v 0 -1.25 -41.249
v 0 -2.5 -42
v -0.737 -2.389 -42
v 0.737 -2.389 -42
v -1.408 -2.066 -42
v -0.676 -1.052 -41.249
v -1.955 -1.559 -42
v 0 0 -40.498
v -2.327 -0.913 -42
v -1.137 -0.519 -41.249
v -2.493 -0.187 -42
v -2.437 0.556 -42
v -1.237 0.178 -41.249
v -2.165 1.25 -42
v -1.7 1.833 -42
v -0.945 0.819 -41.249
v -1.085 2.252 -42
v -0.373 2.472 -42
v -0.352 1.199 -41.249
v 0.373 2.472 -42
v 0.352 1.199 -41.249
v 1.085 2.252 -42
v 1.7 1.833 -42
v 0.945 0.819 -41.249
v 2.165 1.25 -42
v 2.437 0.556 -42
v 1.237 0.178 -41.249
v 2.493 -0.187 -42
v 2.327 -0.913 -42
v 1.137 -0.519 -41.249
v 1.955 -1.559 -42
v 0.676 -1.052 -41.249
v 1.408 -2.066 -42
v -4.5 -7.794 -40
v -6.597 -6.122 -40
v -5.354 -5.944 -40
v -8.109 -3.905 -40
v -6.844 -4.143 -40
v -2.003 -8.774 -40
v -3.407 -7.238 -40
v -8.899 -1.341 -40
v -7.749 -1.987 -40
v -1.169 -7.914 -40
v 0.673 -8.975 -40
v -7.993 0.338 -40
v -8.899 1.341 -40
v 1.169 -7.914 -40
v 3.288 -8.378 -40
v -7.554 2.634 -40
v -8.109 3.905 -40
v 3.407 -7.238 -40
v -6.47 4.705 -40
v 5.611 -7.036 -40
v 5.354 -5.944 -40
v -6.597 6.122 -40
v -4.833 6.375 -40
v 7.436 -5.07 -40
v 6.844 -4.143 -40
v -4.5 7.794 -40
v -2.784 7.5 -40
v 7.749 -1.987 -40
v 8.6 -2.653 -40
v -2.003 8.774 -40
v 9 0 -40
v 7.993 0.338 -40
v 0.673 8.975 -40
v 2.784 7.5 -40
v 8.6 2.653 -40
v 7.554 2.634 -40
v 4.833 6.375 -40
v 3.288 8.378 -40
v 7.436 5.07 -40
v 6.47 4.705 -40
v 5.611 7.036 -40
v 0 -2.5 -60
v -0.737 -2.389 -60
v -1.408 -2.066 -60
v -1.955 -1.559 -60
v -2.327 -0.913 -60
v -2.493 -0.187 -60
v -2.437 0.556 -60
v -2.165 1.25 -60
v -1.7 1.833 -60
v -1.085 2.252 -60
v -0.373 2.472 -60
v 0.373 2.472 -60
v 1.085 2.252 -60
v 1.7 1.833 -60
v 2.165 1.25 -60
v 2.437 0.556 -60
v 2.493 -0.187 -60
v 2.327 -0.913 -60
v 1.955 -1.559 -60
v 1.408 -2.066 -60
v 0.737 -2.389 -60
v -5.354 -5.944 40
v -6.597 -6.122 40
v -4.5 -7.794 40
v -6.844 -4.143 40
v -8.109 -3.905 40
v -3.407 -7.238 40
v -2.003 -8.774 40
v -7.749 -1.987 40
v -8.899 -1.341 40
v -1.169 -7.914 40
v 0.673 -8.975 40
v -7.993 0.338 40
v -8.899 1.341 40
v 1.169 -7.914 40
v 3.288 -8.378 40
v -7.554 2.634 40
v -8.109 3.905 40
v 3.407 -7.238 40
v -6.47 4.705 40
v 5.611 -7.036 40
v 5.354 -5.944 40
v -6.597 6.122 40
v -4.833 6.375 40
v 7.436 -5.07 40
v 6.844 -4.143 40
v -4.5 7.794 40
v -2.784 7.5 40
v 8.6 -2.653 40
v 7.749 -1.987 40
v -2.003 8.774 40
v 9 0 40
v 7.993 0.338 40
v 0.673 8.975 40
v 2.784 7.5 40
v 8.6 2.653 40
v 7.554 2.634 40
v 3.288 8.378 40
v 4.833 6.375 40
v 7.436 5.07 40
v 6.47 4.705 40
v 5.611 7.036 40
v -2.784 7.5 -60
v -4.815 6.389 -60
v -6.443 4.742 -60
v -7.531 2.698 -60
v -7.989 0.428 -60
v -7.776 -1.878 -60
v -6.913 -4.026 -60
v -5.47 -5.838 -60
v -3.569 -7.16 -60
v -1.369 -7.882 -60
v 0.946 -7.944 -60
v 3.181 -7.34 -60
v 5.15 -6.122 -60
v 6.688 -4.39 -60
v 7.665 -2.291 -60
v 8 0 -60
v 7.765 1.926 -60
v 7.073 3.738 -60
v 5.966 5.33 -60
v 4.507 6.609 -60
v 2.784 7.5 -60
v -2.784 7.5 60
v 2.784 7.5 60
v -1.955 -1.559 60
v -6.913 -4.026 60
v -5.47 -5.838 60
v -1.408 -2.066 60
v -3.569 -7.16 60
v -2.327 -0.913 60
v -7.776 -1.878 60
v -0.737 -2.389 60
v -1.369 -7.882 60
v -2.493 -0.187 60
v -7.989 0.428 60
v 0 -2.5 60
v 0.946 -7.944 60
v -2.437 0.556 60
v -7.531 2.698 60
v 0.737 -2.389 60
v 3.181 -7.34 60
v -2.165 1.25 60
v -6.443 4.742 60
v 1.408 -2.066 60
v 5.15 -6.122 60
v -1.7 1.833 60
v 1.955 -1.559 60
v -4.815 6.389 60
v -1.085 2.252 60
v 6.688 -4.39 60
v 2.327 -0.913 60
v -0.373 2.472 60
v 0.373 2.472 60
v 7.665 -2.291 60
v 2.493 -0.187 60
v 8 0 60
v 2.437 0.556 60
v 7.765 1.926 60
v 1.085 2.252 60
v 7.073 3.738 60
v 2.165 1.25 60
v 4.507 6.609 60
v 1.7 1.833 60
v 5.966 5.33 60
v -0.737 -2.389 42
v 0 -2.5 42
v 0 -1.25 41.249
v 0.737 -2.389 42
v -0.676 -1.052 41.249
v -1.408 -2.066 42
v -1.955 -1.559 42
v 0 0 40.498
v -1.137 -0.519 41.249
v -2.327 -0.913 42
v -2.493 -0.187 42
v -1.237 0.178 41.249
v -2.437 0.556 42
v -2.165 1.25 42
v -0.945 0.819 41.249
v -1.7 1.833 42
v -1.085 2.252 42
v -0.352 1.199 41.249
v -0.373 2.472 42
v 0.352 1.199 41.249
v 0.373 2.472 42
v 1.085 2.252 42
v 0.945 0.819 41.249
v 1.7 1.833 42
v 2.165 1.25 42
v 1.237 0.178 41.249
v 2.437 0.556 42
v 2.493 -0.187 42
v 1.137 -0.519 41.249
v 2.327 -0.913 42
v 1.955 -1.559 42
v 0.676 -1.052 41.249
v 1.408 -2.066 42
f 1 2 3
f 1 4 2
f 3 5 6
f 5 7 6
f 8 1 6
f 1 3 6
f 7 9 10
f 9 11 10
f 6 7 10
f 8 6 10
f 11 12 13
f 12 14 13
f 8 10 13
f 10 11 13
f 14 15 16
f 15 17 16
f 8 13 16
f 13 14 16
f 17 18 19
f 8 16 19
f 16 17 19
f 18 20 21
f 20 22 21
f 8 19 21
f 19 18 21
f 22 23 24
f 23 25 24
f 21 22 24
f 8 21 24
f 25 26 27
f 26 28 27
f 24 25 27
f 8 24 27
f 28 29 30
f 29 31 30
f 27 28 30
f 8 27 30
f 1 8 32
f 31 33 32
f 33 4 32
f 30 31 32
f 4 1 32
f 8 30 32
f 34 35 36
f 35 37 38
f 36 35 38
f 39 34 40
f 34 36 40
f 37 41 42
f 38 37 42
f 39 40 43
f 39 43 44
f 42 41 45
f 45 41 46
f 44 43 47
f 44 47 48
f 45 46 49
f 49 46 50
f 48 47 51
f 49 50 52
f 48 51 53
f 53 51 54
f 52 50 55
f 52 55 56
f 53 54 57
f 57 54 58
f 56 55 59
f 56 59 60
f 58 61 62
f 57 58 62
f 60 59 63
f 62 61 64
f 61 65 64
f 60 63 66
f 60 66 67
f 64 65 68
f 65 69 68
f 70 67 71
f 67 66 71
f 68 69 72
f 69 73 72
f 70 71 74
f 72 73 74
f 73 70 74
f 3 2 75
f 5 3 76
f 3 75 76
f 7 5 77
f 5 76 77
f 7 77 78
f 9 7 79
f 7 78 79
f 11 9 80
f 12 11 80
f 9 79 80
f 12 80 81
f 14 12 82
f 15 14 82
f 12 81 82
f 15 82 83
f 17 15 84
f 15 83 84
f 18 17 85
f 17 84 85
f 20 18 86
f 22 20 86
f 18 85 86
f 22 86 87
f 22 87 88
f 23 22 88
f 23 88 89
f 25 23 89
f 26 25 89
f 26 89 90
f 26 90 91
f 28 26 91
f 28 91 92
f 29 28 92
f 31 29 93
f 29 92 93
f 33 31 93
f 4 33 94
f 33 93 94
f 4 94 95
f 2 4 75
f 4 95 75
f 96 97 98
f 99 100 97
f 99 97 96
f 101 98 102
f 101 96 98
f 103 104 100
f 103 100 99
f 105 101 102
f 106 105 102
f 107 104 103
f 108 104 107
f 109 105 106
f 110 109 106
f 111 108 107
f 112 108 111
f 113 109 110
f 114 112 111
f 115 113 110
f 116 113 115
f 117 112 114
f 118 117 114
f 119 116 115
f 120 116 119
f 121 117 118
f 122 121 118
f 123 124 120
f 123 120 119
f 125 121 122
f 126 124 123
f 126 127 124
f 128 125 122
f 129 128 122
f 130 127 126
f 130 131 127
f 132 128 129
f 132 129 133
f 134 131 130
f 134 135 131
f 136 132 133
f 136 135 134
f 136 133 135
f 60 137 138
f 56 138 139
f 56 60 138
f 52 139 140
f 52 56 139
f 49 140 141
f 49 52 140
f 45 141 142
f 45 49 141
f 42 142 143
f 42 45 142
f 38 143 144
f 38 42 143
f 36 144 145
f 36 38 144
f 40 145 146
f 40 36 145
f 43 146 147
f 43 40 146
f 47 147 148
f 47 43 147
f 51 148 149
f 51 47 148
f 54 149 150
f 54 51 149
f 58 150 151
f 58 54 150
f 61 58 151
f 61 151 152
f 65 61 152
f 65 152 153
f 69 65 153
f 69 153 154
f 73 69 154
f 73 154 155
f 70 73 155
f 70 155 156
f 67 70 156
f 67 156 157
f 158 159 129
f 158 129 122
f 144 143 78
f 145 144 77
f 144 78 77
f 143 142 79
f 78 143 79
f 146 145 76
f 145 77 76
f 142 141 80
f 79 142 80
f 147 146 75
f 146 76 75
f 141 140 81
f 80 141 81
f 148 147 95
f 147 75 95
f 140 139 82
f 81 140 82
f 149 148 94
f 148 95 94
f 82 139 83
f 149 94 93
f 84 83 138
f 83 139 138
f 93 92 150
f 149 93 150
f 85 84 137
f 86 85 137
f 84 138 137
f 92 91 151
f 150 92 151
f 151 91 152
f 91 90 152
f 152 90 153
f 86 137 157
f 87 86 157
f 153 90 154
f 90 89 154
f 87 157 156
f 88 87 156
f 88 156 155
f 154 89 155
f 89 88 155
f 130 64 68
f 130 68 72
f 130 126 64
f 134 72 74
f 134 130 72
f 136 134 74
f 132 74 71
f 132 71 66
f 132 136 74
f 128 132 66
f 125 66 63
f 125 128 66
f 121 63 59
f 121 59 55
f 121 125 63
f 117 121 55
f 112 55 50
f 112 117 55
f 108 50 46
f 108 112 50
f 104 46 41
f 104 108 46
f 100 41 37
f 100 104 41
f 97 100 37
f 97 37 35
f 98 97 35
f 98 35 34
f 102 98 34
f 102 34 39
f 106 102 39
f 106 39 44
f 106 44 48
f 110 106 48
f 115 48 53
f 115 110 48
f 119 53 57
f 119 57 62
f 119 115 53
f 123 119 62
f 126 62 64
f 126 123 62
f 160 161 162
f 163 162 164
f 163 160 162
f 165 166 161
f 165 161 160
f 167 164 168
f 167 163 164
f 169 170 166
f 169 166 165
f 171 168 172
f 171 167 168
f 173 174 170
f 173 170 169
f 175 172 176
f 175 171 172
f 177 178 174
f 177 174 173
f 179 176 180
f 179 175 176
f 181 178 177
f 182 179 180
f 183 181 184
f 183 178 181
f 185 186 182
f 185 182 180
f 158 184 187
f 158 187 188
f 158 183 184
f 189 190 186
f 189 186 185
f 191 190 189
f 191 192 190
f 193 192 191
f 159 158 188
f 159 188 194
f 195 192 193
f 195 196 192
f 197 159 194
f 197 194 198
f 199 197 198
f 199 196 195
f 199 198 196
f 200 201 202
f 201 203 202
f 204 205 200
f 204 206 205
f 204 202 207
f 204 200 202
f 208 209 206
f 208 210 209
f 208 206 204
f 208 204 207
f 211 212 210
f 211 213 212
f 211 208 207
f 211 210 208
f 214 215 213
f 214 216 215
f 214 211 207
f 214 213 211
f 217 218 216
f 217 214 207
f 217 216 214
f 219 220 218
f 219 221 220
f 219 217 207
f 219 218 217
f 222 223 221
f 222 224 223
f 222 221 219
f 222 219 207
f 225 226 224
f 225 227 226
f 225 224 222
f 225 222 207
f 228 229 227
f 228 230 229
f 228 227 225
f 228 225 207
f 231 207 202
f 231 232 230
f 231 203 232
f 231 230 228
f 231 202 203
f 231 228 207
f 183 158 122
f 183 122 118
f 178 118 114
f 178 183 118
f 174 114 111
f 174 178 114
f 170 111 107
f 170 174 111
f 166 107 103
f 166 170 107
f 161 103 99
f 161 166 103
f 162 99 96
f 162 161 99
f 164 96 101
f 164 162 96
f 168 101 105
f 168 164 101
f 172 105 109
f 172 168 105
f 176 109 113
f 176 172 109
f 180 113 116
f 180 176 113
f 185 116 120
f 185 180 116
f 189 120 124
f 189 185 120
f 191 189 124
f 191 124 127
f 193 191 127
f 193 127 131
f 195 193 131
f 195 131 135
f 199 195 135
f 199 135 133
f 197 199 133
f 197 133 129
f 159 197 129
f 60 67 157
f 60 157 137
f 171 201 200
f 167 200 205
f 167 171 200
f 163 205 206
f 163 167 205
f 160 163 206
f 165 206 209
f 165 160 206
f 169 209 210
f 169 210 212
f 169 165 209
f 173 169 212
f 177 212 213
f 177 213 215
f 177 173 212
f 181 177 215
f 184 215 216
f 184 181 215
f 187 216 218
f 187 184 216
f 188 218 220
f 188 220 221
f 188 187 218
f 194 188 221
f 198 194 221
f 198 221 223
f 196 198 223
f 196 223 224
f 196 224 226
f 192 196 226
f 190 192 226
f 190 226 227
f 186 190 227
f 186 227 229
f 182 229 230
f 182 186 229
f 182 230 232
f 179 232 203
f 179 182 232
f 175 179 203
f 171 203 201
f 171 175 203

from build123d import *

# Parameters (mm, degrees)
EXTRUDE_1_DEPTH = 60
SKETCH_1_3_R    = 9
EXTRUDE_2_DEPTH = 40


with BuildPart() as part:
    # 草图1 → 凸台-拉伸1 (new, symmetric)
    with BuildSketch(Plane.XY):
        with BuildLine():
            Line((2.783882181, 7.5), (-2.783882181, 7.5))
            ThreePointArc((-2.783882181, 7.5), (-4.567764363, -6.567764363), (8, 0))
            ThreePointArc((8, 0), (6.567764363, 4.567764363), (2.783882181, 7.5))
        make_face()
    extrude(amount=EXTRUDE_1_DEPTH, both=True)

    # 草图1<3> → 凸台-拉伸2 (add, symmetric)
    with BuildSketch(Plane.XY):
        Circle(SKETCH_1_3_R)
        with BuildLine():
            Line((-2.783882181, 7.5), (2.783882181, 7.5))
            ThreePointArc((2.783882181, 7.5), (0, -8), (-2.783882181, 7.5))
        make_face(mode=Mode.SUBTRACT)
    extrude(amount=EXTRUDE_2_DEPTH, both=True)

    # 草图4 → M6 螺纹孔1 (revolve, cut)
    with BuildSketch(Plane(origin=(0, 0, 60), x_dir=(0, -1, 0), z_dir=(1, 0, 0))):
        Polygon((0, 0), (0, 19.502151548), (2.5, 18), (2.5, 0), align=None)
    hole_wizard_m6_1 = revolve(axis=Axis((0, 0, 66.35), (0, 0, -1)), mode=Mode.SUBTRACT)

    # 镜向1: M6 螺纹孔1 across plane
    add(hole_wizard_m6_1.mirror(Plane.XY), mode=Mode.SUBTRACT)


solid = part.part
